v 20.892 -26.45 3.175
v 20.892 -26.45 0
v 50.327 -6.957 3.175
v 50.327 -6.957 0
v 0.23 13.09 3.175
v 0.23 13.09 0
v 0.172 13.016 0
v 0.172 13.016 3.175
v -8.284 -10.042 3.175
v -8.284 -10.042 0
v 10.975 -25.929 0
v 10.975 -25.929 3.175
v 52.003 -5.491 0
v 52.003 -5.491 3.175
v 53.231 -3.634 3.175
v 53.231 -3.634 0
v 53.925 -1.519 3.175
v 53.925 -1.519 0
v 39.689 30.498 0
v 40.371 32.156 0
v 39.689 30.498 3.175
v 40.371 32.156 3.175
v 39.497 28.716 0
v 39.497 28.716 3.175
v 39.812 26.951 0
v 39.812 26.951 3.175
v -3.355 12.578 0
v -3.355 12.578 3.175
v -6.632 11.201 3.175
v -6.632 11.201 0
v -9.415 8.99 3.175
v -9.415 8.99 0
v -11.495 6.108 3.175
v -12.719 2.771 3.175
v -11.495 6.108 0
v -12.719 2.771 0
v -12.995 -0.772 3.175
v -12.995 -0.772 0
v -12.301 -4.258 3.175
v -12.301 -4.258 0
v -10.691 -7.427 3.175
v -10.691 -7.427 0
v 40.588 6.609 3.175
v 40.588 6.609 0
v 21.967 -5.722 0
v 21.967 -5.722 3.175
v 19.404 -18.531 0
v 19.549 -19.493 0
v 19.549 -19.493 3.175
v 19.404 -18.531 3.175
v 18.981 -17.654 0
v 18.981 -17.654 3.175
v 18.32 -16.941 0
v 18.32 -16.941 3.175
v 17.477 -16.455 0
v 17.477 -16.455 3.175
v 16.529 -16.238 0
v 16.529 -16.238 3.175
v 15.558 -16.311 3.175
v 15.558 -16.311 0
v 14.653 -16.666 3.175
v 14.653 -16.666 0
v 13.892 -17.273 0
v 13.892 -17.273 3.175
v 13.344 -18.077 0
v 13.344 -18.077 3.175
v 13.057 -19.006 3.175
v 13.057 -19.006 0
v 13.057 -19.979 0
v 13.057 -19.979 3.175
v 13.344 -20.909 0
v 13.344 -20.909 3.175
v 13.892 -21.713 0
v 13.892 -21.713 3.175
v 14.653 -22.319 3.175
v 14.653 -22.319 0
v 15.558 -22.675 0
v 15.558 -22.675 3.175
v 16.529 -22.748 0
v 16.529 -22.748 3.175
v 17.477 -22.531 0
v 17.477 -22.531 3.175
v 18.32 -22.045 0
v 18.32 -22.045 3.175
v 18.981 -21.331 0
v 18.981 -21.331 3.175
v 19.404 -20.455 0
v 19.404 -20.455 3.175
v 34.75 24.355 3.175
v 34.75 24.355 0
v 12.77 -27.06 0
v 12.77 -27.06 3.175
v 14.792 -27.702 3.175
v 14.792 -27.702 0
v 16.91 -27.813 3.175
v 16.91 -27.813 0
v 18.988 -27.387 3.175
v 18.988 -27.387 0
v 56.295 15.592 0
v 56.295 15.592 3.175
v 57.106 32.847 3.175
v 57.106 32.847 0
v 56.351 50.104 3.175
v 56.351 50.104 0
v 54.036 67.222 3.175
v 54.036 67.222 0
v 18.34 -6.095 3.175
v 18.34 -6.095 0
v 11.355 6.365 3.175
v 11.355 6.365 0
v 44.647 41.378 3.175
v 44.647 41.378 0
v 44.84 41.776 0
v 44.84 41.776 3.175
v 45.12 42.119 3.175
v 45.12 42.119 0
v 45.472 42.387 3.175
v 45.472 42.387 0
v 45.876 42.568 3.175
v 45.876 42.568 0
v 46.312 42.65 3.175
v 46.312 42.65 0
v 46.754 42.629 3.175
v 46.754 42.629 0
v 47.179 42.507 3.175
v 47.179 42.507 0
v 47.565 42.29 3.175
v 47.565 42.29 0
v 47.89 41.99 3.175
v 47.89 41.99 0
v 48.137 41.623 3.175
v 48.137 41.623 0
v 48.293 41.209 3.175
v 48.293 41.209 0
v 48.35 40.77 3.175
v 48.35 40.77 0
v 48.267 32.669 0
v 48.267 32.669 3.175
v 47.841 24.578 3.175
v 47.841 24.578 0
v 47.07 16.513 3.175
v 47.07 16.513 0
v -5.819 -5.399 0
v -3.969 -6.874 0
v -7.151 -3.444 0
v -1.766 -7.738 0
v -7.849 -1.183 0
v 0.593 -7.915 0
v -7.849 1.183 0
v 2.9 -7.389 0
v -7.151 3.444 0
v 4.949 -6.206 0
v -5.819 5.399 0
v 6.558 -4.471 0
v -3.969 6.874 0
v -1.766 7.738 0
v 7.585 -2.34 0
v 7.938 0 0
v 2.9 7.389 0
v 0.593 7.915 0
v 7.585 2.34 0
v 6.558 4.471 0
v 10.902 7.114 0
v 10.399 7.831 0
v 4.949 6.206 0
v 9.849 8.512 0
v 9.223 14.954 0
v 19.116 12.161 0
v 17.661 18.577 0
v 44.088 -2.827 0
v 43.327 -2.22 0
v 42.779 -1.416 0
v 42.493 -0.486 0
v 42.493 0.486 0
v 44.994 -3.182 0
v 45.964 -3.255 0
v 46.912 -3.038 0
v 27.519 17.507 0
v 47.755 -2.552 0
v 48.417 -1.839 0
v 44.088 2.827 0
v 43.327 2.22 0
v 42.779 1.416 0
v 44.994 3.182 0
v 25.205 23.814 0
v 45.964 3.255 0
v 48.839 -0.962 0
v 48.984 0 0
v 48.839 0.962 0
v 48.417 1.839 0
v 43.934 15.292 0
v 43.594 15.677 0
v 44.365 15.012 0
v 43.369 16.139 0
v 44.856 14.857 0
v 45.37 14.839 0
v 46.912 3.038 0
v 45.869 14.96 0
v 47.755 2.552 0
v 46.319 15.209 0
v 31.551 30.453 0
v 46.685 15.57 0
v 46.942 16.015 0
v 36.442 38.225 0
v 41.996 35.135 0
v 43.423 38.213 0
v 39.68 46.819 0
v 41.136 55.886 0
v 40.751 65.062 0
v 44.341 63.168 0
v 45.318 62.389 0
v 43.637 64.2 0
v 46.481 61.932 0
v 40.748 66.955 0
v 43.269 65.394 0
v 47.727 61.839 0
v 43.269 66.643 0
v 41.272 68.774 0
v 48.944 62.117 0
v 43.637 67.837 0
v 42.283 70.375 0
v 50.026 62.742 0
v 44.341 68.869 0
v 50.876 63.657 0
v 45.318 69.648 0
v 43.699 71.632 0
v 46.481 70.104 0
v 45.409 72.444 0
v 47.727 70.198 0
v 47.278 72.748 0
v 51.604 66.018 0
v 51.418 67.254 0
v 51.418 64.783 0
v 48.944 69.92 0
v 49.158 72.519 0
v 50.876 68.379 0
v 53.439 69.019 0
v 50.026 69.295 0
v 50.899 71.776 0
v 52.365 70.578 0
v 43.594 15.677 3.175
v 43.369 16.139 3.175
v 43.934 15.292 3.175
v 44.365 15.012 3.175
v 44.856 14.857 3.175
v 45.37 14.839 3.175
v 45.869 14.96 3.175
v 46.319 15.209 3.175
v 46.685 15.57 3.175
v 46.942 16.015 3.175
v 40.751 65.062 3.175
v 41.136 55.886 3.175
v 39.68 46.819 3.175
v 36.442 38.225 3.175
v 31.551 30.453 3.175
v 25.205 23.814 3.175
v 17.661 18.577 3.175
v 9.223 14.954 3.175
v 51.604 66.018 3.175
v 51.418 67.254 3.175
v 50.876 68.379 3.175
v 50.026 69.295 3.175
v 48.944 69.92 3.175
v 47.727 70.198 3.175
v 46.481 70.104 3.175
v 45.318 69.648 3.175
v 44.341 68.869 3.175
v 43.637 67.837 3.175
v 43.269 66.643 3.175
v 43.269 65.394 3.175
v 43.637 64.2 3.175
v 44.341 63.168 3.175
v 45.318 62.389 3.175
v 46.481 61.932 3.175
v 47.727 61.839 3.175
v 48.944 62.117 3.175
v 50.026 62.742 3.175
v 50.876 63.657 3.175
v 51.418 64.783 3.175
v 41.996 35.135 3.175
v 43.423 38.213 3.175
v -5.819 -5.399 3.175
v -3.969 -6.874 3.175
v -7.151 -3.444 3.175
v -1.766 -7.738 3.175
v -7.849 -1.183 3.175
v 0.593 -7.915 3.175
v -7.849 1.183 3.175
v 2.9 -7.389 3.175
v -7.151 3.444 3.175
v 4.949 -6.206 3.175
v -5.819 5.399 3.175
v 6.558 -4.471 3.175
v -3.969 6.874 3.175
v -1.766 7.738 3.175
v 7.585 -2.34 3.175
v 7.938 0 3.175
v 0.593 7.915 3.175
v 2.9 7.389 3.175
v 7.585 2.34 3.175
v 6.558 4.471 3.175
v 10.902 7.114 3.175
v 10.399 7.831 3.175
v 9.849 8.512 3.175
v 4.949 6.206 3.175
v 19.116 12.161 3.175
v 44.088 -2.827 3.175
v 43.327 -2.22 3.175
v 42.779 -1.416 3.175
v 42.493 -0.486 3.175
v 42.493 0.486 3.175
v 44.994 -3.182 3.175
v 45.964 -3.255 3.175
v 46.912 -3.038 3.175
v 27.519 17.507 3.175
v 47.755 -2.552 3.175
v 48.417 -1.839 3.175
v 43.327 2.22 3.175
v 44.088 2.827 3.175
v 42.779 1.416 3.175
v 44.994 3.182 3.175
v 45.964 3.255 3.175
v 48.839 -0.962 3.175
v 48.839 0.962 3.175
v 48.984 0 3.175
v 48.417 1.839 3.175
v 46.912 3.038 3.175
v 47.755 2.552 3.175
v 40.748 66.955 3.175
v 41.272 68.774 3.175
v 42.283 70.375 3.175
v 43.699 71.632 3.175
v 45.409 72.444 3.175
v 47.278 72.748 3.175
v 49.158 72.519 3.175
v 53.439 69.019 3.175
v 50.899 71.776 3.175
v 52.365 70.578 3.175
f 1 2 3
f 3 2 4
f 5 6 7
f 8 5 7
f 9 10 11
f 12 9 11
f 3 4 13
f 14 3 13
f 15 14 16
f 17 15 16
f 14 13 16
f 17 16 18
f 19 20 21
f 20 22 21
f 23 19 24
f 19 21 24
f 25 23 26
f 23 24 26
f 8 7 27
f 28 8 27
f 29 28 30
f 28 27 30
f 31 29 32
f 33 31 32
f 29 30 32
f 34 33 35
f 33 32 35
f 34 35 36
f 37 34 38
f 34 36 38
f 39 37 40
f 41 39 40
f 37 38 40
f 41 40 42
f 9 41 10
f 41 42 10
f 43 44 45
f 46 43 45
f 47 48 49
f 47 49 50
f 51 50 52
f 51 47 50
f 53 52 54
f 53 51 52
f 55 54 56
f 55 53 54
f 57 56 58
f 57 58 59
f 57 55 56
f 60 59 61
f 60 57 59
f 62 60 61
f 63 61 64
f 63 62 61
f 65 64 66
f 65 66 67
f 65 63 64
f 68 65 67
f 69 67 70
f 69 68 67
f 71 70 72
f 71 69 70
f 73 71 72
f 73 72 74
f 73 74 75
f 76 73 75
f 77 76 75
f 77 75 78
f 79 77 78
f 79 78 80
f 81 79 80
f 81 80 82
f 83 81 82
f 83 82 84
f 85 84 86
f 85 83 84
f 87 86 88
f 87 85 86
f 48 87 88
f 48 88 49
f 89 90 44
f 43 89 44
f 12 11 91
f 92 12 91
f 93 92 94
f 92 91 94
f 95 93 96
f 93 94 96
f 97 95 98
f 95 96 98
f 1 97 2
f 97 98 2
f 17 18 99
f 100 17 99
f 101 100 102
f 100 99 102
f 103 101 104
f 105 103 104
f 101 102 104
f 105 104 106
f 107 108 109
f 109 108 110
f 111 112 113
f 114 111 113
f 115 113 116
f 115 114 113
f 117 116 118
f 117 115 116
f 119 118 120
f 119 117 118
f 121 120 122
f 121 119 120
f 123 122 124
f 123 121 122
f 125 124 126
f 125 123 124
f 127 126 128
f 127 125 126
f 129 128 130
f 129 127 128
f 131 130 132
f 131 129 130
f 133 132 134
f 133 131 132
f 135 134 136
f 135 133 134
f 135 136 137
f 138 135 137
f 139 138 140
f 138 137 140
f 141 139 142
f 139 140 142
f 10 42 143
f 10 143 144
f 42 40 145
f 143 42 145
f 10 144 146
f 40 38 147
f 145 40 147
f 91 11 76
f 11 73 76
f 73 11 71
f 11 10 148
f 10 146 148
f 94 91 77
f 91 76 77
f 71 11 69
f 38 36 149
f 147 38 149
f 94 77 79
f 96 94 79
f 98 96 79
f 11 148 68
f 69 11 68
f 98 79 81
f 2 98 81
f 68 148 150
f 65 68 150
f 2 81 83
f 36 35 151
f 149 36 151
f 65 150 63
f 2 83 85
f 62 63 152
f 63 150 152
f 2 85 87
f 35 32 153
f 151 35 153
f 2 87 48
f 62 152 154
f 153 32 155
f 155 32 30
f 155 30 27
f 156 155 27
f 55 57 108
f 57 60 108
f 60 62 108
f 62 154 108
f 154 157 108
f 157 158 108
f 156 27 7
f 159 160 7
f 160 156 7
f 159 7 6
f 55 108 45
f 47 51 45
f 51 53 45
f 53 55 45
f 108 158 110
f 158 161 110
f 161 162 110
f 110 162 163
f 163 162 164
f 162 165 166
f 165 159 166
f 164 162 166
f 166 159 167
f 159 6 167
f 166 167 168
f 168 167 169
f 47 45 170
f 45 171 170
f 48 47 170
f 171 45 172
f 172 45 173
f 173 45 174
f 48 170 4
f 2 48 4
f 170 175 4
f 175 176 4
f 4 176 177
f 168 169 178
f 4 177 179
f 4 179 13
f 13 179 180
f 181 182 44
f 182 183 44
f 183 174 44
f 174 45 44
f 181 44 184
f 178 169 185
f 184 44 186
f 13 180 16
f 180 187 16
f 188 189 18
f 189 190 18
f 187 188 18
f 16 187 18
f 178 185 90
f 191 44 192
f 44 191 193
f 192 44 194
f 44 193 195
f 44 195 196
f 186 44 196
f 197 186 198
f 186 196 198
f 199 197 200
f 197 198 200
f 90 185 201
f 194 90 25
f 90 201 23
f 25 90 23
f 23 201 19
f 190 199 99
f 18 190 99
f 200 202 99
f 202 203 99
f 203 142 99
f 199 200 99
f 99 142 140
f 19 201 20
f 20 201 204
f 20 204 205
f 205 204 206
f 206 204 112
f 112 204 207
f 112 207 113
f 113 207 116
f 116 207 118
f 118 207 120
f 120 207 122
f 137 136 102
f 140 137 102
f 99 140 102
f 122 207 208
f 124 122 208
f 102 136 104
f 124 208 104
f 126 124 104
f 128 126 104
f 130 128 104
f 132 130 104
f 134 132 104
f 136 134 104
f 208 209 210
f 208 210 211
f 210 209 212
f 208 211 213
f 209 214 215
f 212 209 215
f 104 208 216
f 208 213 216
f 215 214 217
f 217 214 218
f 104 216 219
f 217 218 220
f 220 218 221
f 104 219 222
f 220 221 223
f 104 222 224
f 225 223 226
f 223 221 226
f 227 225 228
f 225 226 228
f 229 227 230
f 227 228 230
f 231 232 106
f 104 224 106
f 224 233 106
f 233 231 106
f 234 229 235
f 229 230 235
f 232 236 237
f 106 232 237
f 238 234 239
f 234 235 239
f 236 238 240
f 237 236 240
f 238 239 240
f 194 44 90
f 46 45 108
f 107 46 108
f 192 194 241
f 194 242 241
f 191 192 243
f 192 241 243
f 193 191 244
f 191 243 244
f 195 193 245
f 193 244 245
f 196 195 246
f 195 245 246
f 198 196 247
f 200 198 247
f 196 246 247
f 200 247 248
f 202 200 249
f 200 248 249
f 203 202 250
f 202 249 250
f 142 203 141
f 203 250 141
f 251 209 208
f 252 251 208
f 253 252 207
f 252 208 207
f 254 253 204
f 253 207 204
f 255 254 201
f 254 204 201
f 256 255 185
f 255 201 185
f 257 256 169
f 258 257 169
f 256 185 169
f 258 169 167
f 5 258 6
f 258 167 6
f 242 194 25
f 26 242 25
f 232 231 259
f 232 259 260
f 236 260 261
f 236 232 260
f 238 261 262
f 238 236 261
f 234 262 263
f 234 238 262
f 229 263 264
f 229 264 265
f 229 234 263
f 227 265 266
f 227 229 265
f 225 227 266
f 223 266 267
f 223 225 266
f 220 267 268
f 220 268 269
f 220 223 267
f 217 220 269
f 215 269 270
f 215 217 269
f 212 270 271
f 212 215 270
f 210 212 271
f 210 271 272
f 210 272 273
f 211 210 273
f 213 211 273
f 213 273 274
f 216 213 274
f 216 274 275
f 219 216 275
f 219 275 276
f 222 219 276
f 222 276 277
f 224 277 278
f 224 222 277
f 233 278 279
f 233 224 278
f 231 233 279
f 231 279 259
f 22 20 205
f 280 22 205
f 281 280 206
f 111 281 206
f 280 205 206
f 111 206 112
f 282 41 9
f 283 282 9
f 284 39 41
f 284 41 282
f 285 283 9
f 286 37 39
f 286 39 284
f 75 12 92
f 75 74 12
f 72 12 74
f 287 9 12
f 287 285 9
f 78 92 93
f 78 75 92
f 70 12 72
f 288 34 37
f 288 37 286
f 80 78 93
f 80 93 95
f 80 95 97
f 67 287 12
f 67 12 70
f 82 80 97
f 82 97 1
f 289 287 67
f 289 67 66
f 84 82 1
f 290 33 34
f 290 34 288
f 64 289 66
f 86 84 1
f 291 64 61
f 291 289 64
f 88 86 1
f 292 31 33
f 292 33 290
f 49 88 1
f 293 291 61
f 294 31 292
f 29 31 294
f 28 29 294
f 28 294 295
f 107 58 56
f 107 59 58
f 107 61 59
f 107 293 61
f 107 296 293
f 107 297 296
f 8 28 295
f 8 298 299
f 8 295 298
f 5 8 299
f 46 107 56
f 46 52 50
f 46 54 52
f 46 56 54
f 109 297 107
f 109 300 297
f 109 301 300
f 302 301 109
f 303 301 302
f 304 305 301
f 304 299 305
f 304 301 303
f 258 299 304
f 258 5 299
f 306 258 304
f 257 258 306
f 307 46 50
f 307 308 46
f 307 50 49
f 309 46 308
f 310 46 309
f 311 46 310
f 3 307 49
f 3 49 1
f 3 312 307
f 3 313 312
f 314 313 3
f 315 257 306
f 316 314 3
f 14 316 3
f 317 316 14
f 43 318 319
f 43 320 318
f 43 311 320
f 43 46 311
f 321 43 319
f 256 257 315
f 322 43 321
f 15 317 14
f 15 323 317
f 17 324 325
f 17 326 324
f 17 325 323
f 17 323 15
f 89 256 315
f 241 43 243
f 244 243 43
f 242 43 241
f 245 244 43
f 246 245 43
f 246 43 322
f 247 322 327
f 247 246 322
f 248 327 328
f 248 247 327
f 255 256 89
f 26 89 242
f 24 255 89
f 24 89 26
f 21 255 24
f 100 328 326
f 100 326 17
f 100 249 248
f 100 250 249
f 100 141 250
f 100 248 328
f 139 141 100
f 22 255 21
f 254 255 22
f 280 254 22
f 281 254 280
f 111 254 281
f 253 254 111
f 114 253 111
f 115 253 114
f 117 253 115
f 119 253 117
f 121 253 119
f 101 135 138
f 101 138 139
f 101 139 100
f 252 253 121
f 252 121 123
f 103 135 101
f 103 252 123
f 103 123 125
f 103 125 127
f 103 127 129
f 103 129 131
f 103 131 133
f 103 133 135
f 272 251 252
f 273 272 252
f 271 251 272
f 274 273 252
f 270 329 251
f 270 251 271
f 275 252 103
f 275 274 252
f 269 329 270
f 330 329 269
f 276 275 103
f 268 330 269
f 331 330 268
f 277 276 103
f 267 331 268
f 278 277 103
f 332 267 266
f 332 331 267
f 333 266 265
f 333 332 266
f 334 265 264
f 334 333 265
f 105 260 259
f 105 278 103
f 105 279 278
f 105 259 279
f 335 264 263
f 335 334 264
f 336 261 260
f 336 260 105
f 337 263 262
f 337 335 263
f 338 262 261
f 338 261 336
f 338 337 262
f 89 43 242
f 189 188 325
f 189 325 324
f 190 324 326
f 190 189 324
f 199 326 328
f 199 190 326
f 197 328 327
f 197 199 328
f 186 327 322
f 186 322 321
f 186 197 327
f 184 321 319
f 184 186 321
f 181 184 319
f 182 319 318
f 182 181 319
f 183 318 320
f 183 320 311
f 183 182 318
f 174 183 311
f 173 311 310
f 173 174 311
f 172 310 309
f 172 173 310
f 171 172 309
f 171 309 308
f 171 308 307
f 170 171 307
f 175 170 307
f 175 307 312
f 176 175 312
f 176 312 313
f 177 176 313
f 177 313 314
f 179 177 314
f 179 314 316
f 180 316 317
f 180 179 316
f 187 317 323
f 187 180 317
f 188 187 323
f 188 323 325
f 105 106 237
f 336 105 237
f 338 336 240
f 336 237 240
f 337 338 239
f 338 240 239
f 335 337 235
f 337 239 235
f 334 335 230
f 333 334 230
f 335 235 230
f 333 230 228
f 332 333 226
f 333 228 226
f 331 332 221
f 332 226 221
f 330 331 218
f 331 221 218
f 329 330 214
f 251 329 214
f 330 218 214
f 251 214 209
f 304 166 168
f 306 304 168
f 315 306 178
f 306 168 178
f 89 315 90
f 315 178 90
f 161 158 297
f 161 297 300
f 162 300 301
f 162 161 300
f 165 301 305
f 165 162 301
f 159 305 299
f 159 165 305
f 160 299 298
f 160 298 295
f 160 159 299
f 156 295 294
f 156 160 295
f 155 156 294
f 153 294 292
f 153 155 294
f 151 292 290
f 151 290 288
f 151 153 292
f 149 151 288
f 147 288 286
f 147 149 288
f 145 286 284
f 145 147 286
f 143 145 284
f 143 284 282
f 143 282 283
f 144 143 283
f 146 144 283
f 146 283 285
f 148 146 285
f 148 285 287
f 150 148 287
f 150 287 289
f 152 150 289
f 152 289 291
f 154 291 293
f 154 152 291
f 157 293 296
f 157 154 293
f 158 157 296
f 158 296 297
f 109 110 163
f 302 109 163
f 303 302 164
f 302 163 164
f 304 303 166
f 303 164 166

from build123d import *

# Parameters (mm, degrees)
SKETCH2_R           = 7.9375
SKETCH2_R_2         = 3.2639
SKETCH2_R_3         = 4.191
BOSS_EXTRUDE1_DEPTH = 3.175
FILLET3_R           = 1.905
FILLET4_R           = 6.35


with BuildPart() as part:
    # Sketch2 → Boss-Extrude1 (new body)
    with BuildSketch(Plane.XY):
        with BuildLine():
            ThreePointArc((53.924522294, -1.518710351), (57.106411985, 32.846575285), (54.035830718, 67.22198524))
            ThreePointArc((54.035830718, 67.22198524), (46.333024889, 72.662028043), (40.750647472, 65.061742146))
            ThreePointArc((40.750647472, 65.061742146), (31.550758366, 30.452598432), (0.230104832, 13.090356345))
            Line((0.230104832, 13.090356345), (0.171615761, 13.016368706))
            ThreePointArc((0.171615761, 13.016368706), (-12.221668504, 4.481754704), (-8.283857999, -10.041563768))
            Line((-8.283857999, -10.041563768), (10.974906006, -25.929215326))
            ThreePointArc((10.974906006, -25.929215326), (15.847415014, -27.825253688), (20.891605497, -26.449590983))
            Line((20.891605497, -26.449590983), (50.326948559, -6.956773116))
            ThreePointArc((50.326948559, -6.956773116), (52.678920751, -4.603703856), (53.924522294, -1.518710351))
        make_face()
        Circle(SKETCH2_R, mode=Mode.SUBTRACT)
        with Locations((16.284656938, -19.492817867)):
            Circle(SKETCH2_R_2, mode=Mode.SUBTRACT)
        with Locations((45.72, 0)):
            Circle(SKETCH2_R_2, mode=Mode.SUBTRACT)
        with BuildLine():
            Line((40.587817362, 6.608950017), (21.967466437, -5.721910488))
            Line((21.967466437, -5.721910488), (18.339656124, -6.094706177))
            Line((18.339656124, -6.094706177), (11.355144297, 6.365218318))
            ThreePointArc((11.355144297, 6.365218318), (10.656204093, 7.476671758), (9.848859751, 8.512066016))
            ThreePointArc((9.848859751, 8.512066016), (23.445327069, 14.632175726), (34.749899024, 24.354640398))
            Line((34.749899024, 24.354640398), (40.587817362, 6.608950017))
        make_face(mode=Mode.SUBTRACT)
        with BuildLine():
            ThreePointArc((47.523781163, 56.501393309), (48.257752726, 32.370804269), (45.933946154, 8.34115665))
            Line((45.933946154, 8.34115665), (38.882442516, 29.775817606))
            ThreePointArc((38.882442516, 29.775817606), (45.039190515, 42.544935267), (47.523781163, 56.501393309))
        make_face(mode=Mode.SUBTRACT)
        with Locations((47.413333333, 66.018287029)):
            Circle(SKETCH2_R_3, mode=Mode.SUBTRACT)
    extrude(amount=BOSS_EXTRUDE1_DEPTH)

    # Fillet3
    fillet3_edges = [part.edges().sort_by_distance(p)[0] for p in [
        (47.523781163, 56.501393309, 1.5875),
        (45.933946154, 8.34115665, 1.5875),
    ]]
    fillet(fillet3_edges, radius=FILLET3_R)

    # Fillet4
    fillet4_edges = [part.edges().sort_by_distance(p)[0] for p in [
        (38.882442516, 29.775817606, 1.5875),
    ]]
    fillet(fillet4_edges, radius=FILLET4_R)


solid = part.part
